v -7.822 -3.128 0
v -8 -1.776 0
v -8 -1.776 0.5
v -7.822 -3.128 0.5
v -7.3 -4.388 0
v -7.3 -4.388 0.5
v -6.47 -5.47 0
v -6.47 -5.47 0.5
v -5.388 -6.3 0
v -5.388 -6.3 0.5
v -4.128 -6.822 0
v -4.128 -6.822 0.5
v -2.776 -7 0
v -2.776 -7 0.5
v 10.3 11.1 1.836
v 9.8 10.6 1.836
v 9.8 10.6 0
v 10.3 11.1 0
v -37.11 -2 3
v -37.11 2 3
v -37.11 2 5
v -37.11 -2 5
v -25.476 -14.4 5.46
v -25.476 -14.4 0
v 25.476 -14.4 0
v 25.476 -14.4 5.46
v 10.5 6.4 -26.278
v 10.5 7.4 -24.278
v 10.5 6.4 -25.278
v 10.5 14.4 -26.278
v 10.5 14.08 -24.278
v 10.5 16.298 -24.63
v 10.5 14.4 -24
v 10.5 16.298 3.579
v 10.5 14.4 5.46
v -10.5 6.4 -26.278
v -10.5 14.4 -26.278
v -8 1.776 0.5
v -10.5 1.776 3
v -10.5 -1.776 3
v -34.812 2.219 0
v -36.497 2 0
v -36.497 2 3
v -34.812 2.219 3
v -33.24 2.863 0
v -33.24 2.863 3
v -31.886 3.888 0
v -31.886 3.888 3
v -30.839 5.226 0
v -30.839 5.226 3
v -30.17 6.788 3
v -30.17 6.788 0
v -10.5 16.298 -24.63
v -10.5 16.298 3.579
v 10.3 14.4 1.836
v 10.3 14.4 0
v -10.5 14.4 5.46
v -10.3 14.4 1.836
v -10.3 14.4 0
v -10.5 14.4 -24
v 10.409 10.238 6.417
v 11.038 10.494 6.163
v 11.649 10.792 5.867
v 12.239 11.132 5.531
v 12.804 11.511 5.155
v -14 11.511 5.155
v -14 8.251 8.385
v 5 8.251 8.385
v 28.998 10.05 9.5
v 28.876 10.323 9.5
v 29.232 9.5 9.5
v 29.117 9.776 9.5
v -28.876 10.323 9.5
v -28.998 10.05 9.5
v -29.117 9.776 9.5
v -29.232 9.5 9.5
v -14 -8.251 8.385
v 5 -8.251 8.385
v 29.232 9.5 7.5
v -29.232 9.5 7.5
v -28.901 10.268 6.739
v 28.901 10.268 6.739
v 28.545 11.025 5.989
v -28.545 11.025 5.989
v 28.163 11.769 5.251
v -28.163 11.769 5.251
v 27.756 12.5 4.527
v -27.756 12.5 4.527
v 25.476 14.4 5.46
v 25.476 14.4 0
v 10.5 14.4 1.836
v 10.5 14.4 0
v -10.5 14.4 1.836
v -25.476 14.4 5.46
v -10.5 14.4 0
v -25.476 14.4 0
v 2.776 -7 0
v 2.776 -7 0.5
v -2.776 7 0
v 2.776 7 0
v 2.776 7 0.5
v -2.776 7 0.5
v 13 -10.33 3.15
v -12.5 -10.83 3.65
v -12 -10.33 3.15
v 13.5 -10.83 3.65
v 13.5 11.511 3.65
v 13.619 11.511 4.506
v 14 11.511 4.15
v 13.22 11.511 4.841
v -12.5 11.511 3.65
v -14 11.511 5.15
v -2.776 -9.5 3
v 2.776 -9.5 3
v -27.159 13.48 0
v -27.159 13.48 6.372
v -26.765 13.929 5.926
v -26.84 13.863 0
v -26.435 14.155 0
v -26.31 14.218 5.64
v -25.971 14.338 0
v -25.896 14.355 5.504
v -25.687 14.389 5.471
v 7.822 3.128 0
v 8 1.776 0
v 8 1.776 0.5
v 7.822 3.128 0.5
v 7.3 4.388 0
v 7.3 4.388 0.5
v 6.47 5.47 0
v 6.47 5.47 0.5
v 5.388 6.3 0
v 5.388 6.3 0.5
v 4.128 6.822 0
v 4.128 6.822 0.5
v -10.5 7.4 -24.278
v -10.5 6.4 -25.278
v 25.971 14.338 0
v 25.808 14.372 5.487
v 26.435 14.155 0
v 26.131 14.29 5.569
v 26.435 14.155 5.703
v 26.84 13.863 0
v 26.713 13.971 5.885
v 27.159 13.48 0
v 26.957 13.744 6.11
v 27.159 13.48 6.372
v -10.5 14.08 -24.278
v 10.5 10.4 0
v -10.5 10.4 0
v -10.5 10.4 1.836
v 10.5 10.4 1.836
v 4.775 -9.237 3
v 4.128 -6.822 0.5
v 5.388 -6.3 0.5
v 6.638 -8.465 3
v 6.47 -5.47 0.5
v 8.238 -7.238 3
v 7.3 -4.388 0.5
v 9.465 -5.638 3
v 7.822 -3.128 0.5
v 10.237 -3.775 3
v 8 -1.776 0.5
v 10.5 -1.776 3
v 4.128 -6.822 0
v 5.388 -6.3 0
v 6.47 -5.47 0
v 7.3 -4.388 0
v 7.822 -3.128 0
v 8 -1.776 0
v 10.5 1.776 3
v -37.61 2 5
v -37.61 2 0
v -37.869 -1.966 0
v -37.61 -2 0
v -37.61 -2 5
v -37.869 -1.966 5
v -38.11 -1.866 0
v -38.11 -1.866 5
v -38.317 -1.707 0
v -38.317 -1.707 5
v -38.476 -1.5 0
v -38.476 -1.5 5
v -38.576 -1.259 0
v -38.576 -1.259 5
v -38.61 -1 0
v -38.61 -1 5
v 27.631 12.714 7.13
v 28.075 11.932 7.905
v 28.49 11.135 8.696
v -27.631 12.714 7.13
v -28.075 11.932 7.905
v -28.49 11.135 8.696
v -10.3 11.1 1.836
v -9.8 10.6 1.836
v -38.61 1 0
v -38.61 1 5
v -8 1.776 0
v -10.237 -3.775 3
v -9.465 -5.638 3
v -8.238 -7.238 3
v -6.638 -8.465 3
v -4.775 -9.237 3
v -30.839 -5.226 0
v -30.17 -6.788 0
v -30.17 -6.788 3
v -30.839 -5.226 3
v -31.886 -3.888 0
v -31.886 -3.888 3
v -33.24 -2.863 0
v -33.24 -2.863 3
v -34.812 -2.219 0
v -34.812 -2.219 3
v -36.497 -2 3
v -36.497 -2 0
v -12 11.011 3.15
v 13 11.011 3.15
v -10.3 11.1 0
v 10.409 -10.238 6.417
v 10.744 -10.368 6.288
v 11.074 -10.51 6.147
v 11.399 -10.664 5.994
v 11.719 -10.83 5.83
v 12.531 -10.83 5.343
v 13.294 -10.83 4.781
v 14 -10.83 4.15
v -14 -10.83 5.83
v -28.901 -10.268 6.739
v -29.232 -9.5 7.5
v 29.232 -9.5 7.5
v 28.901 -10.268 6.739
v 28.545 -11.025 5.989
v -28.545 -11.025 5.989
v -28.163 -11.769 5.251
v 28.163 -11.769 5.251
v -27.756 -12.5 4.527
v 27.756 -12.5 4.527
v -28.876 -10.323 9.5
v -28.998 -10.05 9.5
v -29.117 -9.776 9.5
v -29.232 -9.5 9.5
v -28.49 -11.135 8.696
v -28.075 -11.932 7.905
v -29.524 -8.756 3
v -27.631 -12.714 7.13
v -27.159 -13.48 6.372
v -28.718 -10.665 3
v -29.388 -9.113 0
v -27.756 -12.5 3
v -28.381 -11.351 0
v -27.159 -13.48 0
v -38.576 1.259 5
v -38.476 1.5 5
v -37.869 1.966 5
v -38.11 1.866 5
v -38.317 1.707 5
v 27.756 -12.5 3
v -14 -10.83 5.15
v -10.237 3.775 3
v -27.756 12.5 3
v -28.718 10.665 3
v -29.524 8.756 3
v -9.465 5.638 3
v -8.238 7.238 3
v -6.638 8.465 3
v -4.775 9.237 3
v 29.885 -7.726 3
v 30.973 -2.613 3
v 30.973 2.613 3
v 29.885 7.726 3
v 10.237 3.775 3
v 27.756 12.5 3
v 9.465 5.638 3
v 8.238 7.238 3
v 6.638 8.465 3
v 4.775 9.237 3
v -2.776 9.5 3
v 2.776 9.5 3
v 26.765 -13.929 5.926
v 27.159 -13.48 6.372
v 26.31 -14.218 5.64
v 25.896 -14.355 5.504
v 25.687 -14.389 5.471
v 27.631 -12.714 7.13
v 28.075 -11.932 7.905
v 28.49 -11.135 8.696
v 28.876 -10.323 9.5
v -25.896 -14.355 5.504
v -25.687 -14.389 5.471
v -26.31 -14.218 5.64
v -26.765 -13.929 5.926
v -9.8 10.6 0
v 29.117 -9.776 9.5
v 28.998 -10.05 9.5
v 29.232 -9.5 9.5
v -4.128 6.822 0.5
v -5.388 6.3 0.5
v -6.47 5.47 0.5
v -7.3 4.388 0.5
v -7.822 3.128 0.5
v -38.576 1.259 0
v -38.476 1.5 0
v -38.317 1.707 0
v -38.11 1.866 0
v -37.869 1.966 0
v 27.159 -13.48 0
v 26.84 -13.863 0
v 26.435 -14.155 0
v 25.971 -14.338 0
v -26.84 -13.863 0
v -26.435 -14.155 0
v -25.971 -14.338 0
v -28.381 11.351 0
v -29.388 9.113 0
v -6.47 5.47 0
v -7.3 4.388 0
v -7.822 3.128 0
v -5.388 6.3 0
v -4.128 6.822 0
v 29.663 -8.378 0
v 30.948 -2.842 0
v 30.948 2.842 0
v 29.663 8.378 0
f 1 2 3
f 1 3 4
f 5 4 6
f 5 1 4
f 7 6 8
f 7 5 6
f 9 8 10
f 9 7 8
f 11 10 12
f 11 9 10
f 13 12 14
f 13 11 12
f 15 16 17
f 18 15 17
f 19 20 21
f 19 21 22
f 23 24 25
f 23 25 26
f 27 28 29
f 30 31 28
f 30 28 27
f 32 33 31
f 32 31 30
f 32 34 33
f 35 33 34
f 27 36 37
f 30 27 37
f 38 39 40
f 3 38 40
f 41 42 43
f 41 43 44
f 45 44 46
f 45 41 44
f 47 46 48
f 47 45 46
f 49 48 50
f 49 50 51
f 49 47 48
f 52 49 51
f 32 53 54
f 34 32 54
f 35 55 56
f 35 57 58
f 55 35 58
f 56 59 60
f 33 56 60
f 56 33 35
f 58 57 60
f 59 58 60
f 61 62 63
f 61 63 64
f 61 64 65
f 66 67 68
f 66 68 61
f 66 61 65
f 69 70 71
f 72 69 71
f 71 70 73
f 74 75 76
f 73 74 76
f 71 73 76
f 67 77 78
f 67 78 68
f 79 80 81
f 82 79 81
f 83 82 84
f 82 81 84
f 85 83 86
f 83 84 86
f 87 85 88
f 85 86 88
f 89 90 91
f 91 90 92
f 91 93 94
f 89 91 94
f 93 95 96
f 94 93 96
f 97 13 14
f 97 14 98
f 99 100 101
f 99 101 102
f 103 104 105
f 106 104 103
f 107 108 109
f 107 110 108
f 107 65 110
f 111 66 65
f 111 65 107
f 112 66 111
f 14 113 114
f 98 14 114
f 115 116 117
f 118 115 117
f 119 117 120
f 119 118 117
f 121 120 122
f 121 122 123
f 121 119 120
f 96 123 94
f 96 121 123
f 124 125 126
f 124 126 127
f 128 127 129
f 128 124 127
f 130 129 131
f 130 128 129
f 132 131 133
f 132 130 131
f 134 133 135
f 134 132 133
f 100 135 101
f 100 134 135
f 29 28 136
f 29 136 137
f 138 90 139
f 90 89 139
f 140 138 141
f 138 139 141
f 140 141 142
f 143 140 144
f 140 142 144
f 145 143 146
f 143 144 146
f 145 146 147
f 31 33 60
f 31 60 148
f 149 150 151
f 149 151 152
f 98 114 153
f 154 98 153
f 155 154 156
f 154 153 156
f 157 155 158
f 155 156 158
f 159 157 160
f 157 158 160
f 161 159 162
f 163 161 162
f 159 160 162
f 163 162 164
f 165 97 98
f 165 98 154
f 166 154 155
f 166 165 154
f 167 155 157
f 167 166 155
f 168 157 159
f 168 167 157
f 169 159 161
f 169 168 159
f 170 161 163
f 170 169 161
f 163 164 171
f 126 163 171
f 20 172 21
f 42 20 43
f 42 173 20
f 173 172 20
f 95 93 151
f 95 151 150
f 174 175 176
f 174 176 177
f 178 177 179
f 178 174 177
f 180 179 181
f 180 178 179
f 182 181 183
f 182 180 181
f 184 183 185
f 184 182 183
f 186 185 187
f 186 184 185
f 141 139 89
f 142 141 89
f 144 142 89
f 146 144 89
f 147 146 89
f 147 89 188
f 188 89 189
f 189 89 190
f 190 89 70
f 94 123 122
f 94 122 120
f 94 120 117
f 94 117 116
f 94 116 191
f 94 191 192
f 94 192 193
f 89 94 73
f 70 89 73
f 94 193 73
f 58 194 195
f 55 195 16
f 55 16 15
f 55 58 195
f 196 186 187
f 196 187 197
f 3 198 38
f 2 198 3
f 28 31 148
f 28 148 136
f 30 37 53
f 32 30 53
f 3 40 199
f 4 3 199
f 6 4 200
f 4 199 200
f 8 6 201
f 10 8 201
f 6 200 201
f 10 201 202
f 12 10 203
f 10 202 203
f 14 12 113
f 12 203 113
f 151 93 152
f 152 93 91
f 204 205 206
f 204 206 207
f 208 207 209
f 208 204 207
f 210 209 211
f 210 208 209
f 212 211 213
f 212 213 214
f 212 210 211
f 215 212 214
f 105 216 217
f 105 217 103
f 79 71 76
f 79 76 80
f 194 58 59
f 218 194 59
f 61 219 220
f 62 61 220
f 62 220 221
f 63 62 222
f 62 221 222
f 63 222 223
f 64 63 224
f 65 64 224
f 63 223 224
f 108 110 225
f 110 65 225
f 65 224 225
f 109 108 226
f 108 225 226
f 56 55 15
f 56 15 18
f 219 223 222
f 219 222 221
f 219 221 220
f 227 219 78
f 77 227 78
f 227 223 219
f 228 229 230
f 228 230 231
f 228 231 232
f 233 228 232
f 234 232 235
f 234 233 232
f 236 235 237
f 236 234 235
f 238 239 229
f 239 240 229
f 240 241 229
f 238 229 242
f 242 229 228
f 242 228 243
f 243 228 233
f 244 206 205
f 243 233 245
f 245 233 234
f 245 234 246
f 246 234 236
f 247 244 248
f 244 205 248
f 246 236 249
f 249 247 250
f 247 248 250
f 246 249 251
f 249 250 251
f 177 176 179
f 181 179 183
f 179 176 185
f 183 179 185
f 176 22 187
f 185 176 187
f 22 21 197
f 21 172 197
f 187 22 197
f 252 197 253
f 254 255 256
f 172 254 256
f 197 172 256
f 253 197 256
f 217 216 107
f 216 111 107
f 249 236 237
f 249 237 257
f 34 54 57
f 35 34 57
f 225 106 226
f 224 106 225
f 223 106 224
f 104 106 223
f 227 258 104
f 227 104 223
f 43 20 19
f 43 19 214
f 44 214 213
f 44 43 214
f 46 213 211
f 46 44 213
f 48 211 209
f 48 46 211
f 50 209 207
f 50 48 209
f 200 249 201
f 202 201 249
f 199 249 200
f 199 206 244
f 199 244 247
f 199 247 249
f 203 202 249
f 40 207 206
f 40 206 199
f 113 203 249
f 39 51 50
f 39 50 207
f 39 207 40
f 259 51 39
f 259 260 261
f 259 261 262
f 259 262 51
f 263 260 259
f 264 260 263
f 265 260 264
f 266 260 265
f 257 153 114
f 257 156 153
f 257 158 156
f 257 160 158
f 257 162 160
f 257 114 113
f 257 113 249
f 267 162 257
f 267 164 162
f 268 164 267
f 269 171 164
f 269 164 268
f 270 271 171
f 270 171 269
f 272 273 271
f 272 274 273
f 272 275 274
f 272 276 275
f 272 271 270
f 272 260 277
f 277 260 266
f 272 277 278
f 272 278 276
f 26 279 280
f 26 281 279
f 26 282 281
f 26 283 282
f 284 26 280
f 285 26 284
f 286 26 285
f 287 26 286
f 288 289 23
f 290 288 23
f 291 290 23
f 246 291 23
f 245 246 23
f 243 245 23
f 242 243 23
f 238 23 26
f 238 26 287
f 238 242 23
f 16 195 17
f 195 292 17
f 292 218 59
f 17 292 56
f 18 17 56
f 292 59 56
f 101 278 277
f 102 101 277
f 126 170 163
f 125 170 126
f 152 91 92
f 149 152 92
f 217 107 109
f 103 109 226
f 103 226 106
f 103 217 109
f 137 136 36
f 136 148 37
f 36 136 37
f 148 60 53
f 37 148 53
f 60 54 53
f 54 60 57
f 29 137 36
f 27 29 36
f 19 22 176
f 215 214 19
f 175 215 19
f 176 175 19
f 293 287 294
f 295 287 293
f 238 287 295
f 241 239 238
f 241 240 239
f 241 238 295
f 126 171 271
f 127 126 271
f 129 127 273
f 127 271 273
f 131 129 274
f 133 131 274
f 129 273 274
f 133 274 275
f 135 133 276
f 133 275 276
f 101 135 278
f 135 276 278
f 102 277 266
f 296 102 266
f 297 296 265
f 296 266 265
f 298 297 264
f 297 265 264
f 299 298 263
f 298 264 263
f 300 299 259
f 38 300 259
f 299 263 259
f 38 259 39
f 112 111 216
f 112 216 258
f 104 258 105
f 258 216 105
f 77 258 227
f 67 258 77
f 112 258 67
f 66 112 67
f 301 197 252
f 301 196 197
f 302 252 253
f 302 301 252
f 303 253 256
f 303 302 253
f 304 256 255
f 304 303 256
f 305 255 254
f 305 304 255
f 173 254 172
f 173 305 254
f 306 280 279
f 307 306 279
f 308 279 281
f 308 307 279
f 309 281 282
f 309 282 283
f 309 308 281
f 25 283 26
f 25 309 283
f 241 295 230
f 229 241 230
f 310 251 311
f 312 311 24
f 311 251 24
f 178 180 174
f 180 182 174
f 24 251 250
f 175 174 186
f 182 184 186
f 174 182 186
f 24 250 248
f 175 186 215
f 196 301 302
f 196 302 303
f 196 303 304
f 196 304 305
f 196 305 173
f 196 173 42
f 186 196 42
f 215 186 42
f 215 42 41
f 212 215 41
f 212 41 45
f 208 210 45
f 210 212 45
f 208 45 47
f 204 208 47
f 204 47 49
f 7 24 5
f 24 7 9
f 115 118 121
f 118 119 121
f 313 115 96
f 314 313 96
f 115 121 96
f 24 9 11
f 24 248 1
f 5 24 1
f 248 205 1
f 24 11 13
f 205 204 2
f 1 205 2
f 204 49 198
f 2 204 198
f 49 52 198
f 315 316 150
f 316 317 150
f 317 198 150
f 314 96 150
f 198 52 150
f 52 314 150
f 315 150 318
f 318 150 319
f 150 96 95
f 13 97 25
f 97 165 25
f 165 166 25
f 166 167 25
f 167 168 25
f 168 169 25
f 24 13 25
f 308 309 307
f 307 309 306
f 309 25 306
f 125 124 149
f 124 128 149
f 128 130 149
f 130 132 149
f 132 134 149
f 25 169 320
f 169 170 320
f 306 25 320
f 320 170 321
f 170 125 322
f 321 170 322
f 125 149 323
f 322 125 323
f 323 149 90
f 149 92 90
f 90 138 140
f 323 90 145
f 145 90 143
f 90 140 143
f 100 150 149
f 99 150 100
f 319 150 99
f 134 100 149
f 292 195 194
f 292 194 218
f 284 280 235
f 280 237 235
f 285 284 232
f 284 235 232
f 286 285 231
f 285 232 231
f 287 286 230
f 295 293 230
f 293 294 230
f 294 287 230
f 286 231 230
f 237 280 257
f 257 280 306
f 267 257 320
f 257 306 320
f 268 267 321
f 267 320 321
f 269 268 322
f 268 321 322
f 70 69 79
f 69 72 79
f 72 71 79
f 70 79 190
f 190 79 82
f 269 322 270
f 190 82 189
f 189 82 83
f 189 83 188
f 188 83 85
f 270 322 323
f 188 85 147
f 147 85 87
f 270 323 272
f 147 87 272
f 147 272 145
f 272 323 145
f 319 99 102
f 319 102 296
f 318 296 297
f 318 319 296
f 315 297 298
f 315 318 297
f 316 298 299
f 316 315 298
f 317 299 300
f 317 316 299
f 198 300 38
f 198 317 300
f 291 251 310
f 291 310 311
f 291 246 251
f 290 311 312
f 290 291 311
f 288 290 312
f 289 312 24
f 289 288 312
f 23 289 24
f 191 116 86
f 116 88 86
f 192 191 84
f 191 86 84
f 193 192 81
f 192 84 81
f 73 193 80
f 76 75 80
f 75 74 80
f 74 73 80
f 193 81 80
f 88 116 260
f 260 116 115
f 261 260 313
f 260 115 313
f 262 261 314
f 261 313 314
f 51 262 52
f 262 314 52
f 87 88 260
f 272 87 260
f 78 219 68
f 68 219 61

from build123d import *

# Parameters (mm, degrees)
BOSS_EXTRUDE1_DEPTH      = 3
CHAMFER1_SIZE            = 2.5
BOSS_EXTRUDE2_DEPTH      = 33
BOSS_EXTRUDE2_DEPTH_BACK = 35
SKETCH1_3_OUTSIDE_W      = 84.892
SKETCH1_3_OUTSIDE_H      = 45.692
CUT_EXTRUDE3_DEPTH       = 33
BOSS_EXTRUDE3_DEPTH      = 14
BOSS_EXTRUDE3_DEPTH_BACK = 14
CHAMFER3_SIZE            = 0.5
BOSS_EXTRUDE4_DEPTH      = 3
BOSS_EXTRUDE5_START      = -3
BOSS_EXTRUDE5_DEPTH      = 2
FILLET2_R                = 2
BOSS_EXTRUDE6_DEPTH      = 10.5
BOSS_EXTRUDE6_DEPTH_BACK = 10.5
SKETCH6_W                = 21
SKETCH6_H                = 1.835605581
CUT_EXTRUDE4_DEPTH       = 4
SKETCH7_W                = 20.6
SKETCH7_H                = 1.835605581
BOSS_EXTRUDE8_DEPTH      = 3.8
CHAMFER9_SIZE            = 0.5
CHAMFER10_SIZE           = 9
CHAMFER10_SIZE2          = 3.275732108
CHAMFER11_SIZE           = 1
CHAMFER12_SIZE           = 2
FILLET3_R                = 10


with BuildPart() as part:
    # Sketch1 → Boss-Extrude1 (new body)
    with BuildSketch(Plane.XY):
        with BuildLine():
            Line((-26.54, -14.4), (26.54, -14.4))
            ThreePointArc((26.54, -14.4), (31.11, 0), (26.54, 14.4))
            Line((26.54, 14.4), (-26.54, 14.4))
            ThreePointArc((-26.54, 14.4), (-31.11, 0), (-26.54, -14.4))
        make_face()
        with BuildLine():
            Line((-2.776416588, -7), (2.776416588, -7))
            ThreePointArc((2.776416588, -7), (6.470047841, -5.470047841), (8, -1.776416588))
            Line((8, -1.776416588), (8, 1.776416588))
            ThreePointArc((8, 1.776416588), (6.470047841, 5.470047841), (2.776416588, 7))
            Line((2.776416588, 7), (-2.776416588, 7))
            ThreePointArc((-2.776416588, 7), (-6.470047841, 5.470047841), (-8, 1.776416588))
            Line((-8, 1.776416588), (-8, -1.776416588))
            ThreePointArc((-8, -1.776416588), (-6.470047841, -5.470047841), (-2.776416588, -7))
        make_face(mode=Mode.SUBTRACT)
    extrude(amount=BOSS_EXTRUDE1_DEPTH)

    # Chamfer1
    chamfer1_edges = [part.edges().sort_by_distance(p)[0] for p in [
        (6.470047841, 5.470047841, 3),
        (0, 7, 3),
        (-6.470047841, 5.470047841, 3),
        (-8, 0, 3),
        (-6.470047841, -5.470047841, 3),
        (0, -7, 3),
        (6.470047841, -5.470047841, 3),
        (8, 0, 3),
    ]]
    chamfer(chamfer1_edges, length=CHAMFER1_SIZE)

    # Sketch2 → Boss-Extrude2 (add, two sides: drawn at the far end of the back side and taken through both)
    with BuildSketch(Plane(origin=(0, 0, 0), x_dir=(0, 0, -1), z_dir=(1, 0, 0)).offset(-BOSS_EXTRUDE2_DEPTH_BACK)):
        Polygon((-7.5, -9.5), (-4.526984069, -12.5), (-3, -12.5), (-3, -14.4), (-5.459809425, -14.4), (-9.5, -10.323139329), (-9.5, -9.5), align=None)
        Polygon((-5.459809425, 14.4), (-9.5, 10.323139329), (-9.5, 9.5), (-7.5, 9.5), (-4.526984069, 12.5), (-3, 12.5), (-3, 14.4), align=None)
    extrude(amount=BOSS_EXTRUDE2_DEPTH + BOSS_EXTRUDE2_DEPTH_BACK)

    # Sketch1<3> outside → Cut-Extrude3 (cut)
    # profile 1 of 2: a face of its own
    with BuildSketch(Plane.XY):
        with Locations((-1, 0)):
            Rectangle(SKETCH1_3_OUTSIDE_W, SKETCH1_3_OUTSIDE_H)
        with BuildLine():
            Line((-26.54, -14.4), (26.54, -14.4))
            ThreePointArc((26.54, -14.4), (31.11, 0), (26.54, 14.4))
            Line((26.54, 14.4), (-26.54, 14.4))
            ThreePointArc((-26.54, 14.4), (-31.11, 0), (-26.54, -14.4))
        make_face(mode=Mode.SUBTRACT)
    # profile 2 of 2: a face of its own
    with BuildSketch(Plane.XY):
        with BuildLine():
            Line((-2.776416588, -7), (2.776416588, -7))
            ThreePointArc((2.776416588, -7), (6.470047841, -5.470047841), (8, -1.776416588))
            Line((8, -1.776416588), (8, 1.776416588))
            ThreePointArc((8, 1.776416588), (6.470047841, 5.470047841), (2.776416588, 7))
            Line((2.776416588, 7), (-2.776416588, 7))
            ThreePointArc((-2.776416588, 7), (-6.470047841, 5.470047841), (-8, 1.776416588))
            Line((-8, 1.776416588), (-8, -1.776416588))
            ThreePointArc((-8, -1.776416588), (-6.470047841, -5.470047841), (-2.776416588, -7))
        make_face()
    extrude(amount=CUT_EXTRUDE3_DEPTH, mode=Mode.SUBTRACT)

    # Sketch4 → Boss-Extrude4 (add)
    with BuildSketch(Plane(origin=(0, 0, 0), x_dir=(-1, 0, 0), z_dir=(0, 0, -1))):
        with BuildLine():
            ThreePointArc((30.169832116, -6.787635659), (32.529805878, -3.331795741), (36.496999573, -2))
            Line((36.496999573, -2), (37.11, -2))
            Line((37.11, -2), (37.11, 2))
            Line((37.11, 2), (36.496999573, 2))
            ThreePointArc((36.496999573, 2), (32.529805878, 3.331795741), (30.169832116, 6.787635659))
            ThreePointArc((30.169832116, 6.787635659), (31.11, 0), (30.169832116, -6.787635659))
        make_face()
        with BuildLine():
            Line((37.11, 2), (37.11, -2))
            Line((37.11, -2), (37.61, -2))
            ThreePointArc((37.61, -2), (38.317106781, -1.707106781), (38.61, -1))
            Line((38.61, -1), (38.61, 1))
            ThreePointArc((38.61, 1), (38.317106781, 1.707106781), (37.61, 2))
            Line((37.61, 2), (37.11, 2))
        make_face()
    extrude(amount=-BOSS_EXTRUDE4_DEPTH)

    # Sketch4<3> → Boss-Extrude5 (add)
    with BuildSketch(Plane(origin=(0, 0, 0), x_dir=(-1, 0, 0), z_dir=(0, 0, -1)).offset(BOSS_EXTRUDE5_START)):
        with BuildLine():
            Line((37.11, 2), (37.11, -2))
            Line((37.11, -2), (37.61, -2))
            ThreePointArc((37.61, -2), (38.317106781, -1.707106781), (38.61, -1))
            Line((38.61, -1), (38.61, 1))
            ThreePointArc((38.61, 1), (38.317106781, 1.707106781), (37.61, 2))
            Line((37.61, 2), (37.11, 2))
        make_face()
    extrude(amount=-BOSS_EXTRUDE5_DEPTH)

    # Fillet2
    fillet2_edges = [part.edges().sort_by_distance(p)[0] for p in [
        (-26.54, -14.4, 2.729904712),
        (-26.54, 14.4, 2.729904712),
        (26.54, 14.4, 2.729904712),
        (26.54, -14.4, 2.729904712),
    ]]
    fillet(fillet2_edges, radius=FILLET2_R)

    # Sketch6 → Cut-Extrude4 (cut)
    with BuildSketch(Plane(origin=(0, 14.4, 0), x_dir=(1, 0, 0), z_dir=(0, 1, 0))):
        with Locations((0, -0.917802791)):
            Rectangle(SKETCH6_W, SKETCH6_H)
    extrude(amount=-CUT_EXTRUDE4_DEPTH, mode=Mode.SUBTRACT)


with BuildPart() as body_2:
    # Sketch3 → Boss-Extrude3 (new, two sides: drawn at the far end of the back side and taken through both)
    with BuildSketch(Plane(origin=(0, 0, 0), x_dir=(0, 0, -1), z_dir=(1, 0, 0)).offset(-BOSS_EXTRUDE3_DEPTH_BACK)):
        Polygon((-3.15, 11.511301569), (-3.15, -10.829758909), (-5.830234929, -10.829758909), (-8.385318876, -8.251484181), (-8.385318876, 8.251484181), (-5.154822534, 11.511301569), align=None)
    extrude(amount=BOSS_EXTRUDE3_DEPTH + BOSS_EXTRUDE3_DEPTH_BACK)

    # Chamfer3
    chamfer3_edges = [body_2.edges().sort_by_distance(p)[0] for p in [
        (0, 11.511301569, 3.15),
        (0, -10.829758909, 3.15),
    ]]
    chamfer(chamfer3_edges, length=CHAMFER3_SIZE)

    # Chamfer10
    chamfer10_edges = [body_2.edges().sort_by_distance(p)[0] for p in [
        (14, 0, 8.385318876),
    ]]
    chamfer10_side = [body_2.faces().sort_by_distance(p)[0] for p in [
        (0, 0, 8.385318876),
    ]]
    chamfer(chamfer10_edges, length=CHAMFER10_SIZE, length2=CHAMFER10_SIZE2, reference=chamfer10_side[0])

    # Chamfer11
    chamfer11_edges = [body_2.edges().sort_by_distance(p)[0] for p in [
        (14, 0.34077133, 3.15),
    ]]
    chamfer(chamfer11_edges, length=CHAMFER11_SIZE)

    # Chamfer12
    chamfer12_edges = [body_2.edges().sort_by_distance(p)[0] for p in [
        (-14, 0.34077133, 3.15),
    ]]
    chamfer(chamfer12_edges, length=CHAMFER12_SIZE)

    # Fillet3
    # the kernel refuses this fillet: 10 mm, written as the material it takes off along each edge
    with BuildSketch(Plane(origin=(14, -20.383884151, 5.109586768), x_dir=(0, 0, -1), z_dir=(0, 1, 0))) as fillet3_piece_1:
        with BuildLine():
            CenterArc((8.089844894, 7.011377828), FILLET3_R, 200, 24.518359904)
            Line((-1.307081314, 3.591176395), (-1.495019838, 3.522772366))
            Line((-1.495019838, 3.522772366), (-0.187938524, -0.068404029))
            Line((-0.187938524, -0.068404029), (0, -0.2))
            ThreePointArc((0, -0.2), (0.479793384, -0.2), (0.816981605, -0.140227557))
            Line((0.816981605, -0.140227557), (0.959586768, 0))
        make_face()
    extrude(amount=41.449310961, mode=Mode.SUBTRACT)


with BuildPart() as body_3:
    # Sketch5 → Boss-Extrude6 (new, two sides: drawn at the far end of the back side and taken through both)
    with BuildSketch(Plane(origin=(0, 0, 0), x_dir=(0, 0, -1), z_dir=(1, 0, 0)).offset(-BOSS_EXTRUDE6_DEPTH_BACK)):
        Polygon((0, 14.4), (24, 14.4), (24.278001924, 14.079736365), (24.278001924, 7.4), (25.278001924, 6.4), (26.278001924, 6.4), (26.278001924, 14.4), (24.630423167, 16.298042842), (-3.578838889, 16.298042842), (-5.459809425, 14.4), align=None)
    extrude(amount=BOSS_EXTRUDE6_DEPTH + BOSS_EXTRUDE6_DEPTH_BACK)

    # Sketch7 → Boss-Extrude8 (add)
    with BuildSketch(Plane(origin=(0, 14.4, 0), x_dir=(1, 0, 0), z_dir=(0, 1, 0))):
        with Locations((0, -0.917802791)):
            Rectangle(SKETCH7_W, SKETCH7_H)
    extrude(amount=-BOSS_EXTRUDE8_DEPTH)

    # Chamfer9
    chamfer9_edges = [body_3.edges().sort_by_distance(p)[0] for p in [
        (-10.3, 10.6, 0.91780279),
        (10.3, 10.6, 0.91780279),
    ]]
    chamfer(chamfer9_edges, length=CHAMFER9_SIZE)


solid = Compound([part.part, body_2.part, body_3.part])
